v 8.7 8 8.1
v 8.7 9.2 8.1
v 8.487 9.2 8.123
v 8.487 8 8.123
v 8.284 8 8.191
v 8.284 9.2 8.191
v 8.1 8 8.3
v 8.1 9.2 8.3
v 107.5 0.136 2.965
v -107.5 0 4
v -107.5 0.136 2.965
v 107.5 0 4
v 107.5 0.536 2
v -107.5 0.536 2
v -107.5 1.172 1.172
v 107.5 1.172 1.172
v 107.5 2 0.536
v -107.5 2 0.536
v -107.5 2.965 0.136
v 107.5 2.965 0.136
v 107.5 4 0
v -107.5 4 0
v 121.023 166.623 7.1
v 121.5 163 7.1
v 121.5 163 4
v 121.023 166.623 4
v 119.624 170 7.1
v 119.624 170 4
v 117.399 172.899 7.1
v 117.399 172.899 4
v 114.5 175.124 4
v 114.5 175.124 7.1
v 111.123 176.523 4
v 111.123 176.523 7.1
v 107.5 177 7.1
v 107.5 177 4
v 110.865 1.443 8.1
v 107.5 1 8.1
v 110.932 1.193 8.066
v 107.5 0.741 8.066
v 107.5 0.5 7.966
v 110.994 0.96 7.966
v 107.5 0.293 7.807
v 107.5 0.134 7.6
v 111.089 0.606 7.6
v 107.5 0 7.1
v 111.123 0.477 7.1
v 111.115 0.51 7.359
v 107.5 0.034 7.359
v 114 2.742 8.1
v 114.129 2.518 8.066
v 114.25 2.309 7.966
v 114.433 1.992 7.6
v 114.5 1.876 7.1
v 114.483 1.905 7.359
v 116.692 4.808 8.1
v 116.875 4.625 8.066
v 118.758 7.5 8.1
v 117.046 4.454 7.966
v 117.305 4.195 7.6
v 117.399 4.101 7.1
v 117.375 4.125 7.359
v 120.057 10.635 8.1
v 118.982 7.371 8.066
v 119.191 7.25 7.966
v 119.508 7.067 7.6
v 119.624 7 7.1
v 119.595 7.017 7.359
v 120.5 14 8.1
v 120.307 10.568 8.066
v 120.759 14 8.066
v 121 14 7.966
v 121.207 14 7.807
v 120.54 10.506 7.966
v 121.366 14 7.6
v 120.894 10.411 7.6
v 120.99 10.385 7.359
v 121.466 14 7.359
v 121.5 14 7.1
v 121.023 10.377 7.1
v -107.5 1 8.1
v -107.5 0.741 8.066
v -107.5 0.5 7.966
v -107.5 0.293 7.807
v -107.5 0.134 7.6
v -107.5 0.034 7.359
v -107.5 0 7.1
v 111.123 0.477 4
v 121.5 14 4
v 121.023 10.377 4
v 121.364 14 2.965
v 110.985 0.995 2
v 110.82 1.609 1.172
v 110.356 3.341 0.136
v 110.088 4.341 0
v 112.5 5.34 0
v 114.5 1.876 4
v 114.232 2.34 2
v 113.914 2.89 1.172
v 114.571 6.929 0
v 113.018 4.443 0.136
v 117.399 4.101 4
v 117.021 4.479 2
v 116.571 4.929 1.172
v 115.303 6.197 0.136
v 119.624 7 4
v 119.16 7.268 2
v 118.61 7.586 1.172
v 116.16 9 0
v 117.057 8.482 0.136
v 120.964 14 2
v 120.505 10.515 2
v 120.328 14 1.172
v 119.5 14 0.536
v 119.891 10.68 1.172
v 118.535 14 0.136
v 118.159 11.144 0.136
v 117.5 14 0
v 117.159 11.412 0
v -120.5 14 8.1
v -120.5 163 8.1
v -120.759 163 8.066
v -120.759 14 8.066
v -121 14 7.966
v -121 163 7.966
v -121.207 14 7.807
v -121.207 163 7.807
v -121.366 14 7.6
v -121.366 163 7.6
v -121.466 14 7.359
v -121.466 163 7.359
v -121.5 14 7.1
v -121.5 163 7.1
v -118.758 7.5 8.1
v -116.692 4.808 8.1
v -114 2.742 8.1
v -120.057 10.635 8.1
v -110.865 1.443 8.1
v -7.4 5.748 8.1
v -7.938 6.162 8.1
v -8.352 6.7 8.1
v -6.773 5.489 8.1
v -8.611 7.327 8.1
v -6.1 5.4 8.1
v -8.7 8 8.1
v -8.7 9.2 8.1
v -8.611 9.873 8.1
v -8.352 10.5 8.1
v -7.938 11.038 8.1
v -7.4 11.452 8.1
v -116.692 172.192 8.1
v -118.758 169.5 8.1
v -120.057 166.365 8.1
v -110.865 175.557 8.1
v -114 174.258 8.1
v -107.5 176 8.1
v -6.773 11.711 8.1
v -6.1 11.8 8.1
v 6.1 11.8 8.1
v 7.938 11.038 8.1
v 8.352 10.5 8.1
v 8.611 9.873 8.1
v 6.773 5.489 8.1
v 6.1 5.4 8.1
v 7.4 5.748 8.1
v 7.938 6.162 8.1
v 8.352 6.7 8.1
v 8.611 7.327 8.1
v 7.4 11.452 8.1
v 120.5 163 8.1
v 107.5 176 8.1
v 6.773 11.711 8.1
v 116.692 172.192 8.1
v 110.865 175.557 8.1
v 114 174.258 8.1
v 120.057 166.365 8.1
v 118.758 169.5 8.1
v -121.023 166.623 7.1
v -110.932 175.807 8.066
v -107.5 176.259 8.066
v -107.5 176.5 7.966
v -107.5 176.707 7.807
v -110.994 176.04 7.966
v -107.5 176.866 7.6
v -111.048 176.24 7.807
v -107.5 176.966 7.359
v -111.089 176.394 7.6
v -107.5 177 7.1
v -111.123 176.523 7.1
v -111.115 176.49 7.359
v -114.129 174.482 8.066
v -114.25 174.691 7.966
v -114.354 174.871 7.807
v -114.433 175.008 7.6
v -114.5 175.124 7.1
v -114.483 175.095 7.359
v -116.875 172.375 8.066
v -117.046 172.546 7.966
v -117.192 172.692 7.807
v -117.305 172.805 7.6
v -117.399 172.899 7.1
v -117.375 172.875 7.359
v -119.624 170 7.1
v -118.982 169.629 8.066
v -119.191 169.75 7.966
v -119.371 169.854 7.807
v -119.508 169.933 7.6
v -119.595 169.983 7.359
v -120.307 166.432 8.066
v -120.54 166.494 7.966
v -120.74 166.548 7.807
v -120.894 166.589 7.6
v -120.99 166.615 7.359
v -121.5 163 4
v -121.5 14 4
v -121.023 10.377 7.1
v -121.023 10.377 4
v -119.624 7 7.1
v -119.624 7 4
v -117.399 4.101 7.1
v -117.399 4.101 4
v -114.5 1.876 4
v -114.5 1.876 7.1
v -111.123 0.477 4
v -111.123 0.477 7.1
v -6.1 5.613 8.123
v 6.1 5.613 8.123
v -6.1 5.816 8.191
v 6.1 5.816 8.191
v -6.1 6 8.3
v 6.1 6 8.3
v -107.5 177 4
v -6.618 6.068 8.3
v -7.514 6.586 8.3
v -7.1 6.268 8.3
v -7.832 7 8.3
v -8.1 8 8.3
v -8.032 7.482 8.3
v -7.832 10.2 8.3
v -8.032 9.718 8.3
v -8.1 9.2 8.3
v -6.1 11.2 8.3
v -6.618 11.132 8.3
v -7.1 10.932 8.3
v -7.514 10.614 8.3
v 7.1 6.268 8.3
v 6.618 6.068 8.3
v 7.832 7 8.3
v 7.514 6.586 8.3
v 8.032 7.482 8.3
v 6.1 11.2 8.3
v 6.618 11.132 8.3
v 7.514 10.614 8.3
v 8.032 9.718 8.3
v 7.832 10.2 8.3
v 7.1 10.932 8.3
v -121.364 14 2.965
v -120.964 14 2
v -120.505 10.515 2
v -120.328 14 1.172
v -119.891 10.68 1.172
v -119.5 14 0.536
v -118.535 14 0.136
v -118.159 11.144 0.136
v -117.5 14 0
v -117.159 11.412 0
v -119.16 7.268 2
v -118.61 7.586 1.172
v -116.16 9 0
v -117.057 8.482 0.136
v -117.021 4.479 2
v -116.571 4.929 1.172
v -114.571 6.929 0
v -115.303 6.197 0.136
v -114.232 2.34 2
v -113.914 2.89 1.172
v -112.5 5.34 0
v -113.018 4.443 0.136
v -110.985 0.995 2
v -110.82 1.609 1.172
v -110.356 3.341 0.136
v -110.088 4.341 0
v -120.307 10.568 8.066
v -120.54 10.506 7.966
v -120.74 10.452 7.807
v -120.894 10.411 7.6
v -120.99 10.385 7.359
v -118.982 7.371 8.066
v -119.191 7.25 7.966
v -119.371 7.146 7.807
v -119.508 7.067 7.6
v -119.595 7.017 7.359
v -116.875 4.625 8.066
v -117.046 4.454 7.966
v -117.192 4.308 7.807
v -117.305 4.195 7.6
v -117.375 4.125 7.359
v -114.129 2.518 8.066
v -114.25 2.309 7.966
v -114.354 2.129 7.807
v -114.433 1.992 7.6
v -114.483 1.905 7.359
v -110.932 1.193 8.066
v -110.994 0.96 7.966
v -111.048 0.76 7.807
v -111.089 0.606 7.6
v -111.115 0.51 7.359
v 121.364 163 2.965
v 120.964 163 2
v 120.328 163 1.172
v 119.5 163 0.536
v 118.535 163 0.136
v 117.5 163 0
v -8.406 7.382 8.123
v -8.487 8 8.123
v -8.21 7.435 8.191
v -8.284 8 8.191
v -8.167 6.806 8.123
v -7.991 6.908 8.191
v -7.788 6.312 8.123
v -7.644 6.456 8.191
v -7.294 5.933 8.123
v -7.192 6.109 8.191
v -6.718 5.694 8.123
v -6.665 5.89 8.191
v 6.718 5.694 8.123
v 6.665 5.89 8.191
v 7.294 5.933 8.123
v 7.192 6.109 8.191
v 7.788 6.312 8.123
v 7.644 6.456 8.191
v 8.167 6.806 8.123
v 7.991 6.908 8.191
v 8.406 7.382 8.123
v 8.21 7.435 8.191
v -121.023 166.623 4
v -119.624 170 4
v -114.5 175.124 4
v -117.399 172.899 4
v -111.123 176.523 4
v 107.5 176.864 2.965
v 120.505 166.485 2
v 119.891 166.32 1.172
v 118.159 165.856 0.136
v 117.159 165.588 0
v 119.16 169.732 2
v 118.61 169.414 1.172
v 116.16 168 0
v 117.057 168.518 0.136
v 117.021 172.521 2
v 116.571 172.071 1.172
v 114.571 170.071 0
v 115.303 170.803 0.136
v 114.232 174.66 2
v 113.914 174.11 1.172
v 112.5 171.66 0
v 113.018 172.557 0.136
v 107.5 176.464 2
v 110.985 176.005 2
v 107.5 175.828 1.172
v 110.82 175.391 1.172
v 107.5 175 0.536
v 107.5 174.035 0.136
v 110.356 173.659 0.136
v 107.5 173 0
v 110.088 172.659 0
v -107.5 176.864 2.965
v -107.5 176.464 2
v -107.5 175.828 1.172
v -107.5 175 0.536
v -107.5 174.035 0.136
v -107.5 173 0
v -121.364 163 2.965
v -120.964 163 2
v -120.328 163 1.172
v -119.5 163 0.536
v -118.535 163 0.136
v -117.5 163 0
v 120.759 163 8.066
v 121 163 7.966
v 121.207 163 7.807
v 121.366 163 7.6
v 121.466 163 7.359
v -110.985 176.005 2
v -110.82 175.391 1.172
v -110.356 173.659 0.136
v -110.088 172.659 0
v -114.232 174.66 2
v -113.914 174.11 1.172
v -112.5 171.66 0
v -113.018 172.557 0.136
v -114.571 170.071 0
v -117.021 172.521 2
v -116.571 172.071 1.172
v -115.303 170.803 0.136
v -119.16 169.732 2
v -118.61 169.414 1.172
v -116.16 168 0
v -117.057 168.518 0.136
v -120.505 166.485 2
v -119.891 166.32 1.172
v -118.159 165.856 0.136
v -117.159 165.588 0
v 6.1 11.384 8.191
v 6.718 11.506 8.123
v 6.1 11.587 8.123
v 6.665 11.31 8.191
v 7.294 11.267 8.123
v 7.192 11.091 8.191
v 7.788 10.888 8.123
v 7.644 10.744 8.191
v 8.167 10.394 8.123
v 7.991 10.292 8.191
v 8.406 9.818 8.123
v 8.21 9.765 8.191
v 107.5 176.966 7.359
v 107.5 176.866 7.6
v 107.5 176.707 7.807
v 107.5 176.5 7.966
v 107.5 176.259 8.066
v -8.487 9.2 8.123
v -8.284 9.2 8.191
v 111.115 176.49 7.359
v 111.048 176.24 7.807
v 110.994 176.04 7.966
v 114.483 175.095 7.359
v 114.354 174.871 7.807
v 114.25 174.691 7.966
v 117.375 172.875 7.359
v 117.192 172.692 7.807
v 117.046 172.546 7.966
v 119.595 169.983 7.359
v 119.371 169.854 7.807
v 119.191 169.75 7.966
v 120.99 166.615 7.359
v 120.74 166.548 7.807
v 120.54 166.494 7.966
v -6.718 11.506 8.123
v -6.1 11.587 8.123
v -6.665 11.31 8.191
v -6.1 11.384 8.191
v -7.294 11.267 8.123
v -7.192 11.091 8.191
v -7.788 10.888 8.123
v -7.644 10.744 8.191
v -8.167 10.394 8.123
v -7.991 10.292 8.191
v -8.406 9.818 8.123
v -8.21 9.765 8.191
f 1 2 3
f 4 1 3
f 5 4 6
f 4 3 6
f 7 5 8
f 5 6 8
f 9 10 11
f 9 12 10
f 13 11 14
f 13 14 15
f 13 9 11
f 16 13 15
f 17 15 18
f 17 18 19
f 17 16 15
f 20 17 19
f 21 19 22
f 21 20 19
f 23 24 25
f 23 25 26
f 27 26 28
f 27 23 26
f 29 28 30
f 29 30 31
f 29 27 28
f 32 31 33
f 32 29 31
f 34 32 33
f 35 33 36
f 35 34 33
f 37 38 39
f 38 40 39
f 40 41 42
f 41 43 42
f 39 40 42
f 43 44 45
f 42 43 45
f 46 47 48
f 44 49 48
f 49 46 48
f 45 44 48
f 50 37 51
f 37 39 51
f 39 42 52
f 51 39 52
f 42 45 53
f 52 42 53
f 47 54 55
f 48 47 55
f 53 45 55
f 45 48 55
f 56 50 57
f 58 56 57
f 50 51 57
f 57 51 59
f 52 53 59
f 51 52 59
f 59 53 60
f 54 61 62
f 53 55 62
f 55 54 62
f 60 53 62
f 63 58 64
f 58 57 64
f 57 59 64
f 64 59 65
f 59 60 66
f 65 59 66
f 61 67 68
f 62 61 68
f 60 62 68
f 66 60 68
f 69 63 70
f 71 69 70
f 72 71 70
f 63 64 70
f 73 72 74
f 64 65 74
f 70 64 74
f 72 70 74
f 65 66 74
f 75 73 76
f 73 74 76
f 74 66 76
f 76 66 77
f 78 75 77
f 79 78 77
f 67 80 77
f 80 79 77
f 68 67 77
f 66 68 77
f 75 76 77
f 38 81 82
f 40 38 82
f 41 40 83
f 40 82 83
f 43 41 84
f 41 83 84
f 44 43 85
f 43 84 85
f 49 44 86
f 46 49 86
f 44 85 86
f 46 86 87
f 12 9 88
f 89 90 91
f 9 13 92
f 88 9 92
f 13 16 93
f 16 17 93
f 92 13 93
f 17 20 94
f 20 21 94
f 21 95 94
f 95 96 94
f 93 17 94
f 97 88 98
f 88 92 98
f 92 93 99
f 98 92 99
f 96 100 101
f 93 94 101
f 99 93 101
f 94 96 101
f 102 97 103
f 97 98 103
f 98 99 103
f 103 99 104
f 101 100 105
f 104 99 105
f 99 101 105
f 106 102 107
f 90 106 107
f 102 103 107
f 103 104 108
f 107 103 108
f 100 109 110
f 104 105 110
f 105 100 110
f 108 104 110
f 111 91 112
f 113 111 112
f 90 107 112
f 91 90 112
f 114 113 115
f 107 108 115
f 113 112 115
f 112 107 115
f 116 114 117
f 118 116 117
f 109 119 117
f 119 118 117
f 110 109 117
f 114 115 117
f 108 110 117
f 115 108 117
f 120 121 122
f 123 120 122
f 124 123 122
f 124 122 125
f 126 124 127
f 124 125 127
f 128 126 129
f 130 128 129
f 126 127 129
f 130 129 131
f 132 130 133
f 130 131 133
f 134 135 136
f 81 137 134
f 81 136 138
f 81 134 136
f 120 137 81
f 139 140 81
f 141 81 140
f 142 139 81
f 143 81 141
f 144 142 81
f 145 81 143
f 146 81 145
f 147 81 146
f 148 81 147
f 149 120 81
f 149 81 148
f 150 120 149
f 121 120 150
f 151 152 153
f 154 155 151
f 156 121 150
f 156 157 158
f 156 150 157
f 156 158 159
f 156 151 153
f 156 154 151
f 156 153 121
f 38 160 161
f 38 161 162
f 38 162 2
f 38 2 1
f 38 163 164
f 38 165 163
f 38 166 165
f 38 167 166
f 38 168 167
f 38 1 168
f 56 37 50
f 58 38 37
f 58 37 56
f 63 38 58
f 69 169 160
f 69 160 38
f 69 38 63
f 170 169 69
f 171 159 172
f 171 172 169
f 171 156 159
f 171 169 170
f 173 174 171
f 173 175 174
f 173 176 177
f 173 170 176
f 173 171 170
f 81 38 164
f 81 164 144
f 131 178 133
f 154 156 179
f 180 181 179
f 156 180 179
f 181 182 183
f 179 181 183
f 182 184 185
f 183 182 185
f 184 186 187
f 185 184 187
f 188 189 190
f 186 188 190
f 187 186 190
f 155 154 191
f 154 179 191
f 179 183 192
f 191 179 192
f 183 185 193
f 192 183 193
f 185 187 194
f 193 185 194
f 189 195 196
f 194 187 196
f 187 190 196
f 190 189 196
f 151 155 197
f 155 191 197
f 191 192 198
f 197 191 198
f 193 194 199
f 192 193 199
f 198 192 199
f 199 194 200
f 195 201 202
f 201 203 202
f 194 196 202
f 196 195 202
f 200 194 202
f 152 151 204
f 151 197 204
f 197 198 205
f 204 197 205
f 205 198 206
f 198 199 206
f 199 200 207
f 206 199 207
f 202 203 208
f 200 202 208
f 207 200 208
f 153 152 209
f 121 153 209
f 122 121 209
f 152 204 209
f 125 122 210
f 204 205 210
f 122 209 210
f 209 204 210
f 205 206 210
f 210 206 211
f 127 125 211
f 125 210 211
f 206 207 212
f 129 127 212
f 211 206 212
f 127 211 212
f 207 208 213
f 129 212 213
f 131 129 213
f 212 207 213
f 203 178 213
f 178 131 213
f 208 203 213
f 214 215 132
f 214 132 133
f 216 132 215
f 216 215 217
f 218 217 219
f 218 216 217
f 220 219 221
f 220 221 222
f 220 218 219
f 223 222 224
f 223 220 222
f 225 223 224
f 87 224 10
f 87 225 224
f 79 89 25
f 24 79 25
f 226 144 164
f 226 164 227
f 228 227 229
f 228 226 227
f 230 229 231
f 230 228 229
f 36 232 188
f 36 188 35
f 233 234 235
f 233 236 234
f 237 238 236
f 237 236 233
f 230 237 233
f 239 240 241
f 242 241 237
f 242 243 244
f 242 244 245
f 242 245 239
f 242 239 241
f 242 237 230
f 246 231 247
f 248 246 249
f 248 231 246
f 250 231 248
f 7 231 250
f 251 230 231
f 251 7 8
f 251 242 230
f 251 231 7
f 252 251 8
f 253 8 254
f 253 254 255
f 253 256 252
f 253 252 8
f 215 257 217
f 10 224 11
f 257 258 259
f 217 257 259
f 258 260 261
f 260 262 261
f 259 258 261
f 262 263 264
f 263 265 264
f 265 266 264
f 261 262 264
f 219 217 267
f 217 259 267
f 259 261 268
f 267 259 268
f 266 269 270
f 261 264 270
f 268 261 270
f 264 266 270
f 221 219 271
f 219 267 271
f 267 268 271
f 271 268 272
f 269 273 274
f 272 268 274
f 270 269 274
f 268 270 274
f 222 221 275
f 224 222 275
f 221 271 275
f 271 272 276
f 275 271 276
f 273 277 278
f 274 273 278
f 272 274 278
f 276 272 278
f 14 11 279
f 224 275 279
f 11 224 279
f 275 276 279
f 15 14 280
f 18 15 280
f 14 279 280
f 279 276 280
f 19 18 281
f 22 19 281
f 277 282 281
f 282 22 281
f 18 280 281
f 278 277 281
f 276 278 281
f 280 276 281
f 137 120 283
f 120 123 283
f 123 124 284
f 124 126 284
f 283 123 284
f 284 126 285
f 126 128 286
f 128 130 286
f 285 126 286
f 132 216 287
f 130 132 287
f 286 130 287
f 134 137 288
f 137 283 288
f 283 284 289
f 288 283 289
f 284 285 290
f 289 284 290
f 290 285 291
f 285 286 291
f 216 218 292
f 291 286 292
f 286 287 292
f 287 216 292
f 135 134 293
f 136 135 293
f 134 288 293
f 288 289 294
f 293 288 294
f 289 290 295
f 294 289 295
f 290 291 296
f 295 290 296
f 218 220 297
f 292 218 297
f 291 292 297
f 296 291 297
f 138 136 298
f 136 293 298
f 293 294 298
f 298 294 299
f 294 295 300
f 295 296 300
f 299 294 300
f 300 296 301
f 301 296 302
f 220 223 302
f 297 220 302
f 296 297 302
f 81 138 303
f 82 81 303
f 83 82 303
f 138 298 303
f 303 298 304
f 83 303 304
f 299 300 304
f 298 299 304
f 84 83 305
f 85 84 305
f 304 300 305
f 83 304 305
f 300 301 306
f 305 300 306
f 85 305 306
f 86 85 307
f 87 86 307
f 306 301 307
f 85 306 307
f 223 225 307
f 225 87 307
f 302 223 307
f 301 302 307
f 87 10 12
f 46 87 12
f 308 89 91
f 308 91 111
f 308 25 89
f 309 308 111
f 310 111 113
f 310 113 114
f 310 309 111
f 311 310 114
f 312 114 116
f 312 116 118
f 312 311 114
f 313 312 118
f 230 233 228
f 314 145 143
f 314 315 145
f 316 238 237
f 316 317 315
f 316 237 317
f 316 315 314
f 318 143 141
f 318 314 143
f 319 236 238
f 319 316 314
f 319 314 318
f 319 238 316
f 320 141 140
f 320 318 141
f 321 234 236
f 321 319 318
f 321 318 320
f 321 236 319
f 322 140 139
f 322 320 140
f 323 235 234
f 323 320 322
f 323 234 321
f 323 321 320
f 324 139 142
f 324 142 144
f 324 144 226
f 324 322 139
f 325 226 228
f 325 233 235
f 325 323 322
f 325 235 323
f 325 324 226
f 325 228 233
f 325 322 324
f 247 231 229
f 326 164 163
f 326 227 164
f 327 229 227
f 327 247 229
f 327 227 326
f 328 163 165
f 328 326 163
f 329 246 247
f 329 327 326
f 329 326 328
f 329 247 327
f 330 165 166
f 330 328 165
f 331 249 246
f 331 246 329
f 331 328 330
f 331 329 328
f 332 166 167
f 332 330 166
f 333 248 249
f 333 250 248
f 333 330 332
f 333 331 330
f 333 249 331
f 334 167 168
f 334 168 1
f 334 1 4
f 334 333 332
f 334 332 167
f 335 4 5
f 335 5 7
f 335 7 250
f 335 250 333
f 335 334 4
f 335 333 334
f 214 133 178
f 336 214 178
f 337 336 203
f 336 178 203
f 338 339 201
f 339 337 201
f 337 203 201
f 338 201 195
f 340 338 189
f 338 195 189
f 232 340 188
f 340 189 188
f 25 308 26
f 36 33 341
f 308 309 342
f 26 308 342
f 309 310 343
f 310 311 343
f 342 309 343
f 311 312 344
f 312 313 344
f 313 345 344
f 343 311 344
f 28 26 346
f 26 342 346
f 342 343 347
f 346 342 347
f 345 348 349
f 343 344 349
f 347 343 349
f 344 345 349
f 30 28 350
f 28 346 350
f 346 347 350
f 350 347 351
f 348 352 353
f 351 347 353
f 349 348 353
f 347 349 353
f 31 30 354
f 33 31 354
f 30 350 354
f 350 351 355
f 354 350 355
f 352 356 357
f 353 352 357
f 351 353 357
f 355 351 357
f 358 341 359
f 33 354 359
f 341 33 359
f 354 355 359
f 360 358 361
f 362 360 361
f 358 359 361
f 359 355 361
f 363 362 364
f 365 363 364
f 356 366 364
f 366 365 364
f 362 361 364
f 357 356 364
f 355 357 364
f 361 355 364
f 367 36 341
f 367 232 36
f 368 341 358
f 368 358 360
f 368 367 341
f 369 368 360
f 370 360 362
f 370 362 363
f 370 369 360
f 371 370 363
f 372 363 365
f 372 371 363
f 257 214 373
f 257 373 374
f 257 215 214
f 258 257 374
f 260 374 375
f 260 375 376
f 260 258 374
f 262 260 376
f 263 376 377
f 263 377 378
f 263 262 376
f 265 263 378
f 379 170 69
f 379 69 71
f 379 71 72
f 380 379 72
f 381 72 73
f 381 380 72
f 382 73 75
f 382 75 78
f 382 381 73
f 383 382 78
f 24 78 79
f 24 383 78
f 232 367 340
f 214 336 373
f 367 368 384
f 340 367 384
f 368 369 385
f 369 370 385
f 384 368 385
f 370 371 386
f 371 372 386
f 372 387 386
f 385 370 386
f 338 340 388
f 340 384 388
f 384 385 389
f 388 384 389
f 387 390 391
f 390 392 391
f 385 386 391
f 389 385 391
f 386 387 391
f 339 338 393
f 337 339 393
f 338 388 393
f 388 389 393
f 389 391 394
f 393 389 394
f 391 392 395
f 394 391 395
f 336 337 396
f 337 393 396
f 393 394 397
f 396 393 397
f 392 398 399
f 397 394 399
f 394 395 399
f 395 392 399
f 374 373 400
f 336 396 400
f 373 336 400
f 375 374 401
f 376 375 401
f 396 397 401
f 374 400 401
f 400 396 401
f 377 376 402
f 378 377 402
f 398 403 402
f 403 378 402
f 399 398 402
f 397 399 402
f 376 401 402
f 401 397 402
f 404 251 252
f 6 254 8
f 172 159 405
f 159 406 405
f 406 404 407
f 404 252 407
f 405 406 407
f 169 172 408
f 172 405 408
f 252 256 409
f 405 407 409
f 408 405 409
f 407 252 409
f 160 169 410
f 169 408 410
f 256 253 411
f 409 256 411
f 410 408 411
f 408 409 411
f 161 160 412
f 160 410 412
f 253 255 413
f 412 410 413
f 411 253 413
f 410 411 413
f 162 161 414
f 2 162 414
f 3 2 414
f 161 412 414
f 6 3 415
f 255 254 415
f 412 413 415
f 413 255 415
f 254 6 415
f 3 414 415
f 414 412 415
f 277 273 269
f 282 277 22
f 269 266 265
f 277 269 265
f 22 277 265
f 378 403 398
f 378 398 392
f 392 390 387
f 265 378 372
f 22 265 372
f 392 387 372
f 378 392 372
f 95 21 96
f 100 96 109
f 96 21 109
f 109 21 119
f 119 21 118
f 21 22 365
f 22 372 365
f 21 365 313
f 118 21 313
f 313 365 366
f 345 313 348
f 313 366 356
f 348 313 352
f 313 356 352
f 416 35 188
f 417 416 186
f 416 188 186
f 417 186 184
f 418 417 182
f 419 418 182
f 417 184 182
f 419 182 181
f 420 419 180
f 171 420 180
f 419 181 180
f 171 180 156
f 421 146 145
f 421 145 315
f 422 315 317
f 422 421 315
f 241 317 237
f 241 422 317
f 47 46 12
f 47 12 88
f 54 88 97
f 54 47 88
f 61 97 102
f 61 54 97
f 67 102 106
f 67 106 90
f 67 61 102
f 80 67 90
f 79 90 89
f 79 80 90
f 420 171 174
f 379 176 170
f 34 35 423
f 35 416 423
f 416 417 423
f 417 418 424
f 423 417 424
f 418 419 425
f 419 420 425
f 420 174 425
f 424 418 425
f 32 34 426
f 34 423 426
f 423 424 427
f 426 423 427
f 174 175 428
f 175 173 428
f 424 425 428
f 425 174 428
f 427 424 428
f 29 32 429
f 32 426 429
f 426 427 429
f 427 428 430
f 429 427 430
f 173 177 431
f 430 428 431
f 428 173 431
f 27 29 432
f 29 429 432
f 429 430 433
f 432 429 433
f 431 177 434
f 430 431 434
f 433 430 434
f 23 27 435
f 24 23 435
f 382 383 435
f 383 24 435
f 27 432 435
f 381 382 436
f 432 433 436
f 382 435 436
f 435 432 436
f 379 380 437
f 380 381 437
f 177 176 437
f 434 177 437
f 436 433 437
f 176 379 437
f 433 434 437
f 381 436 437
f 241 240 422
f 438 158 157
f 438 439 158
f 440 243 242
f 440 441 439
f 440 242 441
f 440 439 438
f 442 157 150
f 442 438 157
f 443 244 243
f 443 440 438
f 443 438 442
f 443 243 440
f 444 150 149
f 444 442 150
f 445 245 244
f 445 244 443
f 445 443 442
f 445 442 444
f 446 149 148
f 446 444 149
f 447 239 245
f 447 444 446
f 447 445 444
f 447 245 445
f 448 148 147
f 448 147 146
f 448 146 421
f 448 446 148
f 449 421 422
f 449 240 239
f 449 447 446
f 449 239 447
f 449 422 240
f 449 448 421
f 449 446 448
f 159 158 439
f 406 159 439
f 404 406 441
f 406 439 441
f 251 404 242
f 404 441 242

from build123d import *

# Parameters (mm, degrees)
F0_W         = 243
F0_H         = 177
F1_DEPTH     = 8.1
F2_R         = 14
F3_W         = 16.2
F3_H         = 5.2
F4_DEPTH     = 0.2
F5_R         = 2
F6_R         = 4
F7_T1_DEPTH  = 12.2
F7_T3_DEPTH  = 1.2
F7_T6_ANGLE  = 90
F7_T8_ANGLE  = 90
F7_T10_ANGLE = 90
F7_T12_ANGLE = 90
F7_T13_DEPTH = 215
F7_T15_DEPTH = 149
F7_T18_ANGLE = 90
F7_T20_ANGLE = 90
F7_T22_ANGLE = 90
F7_T24_ANGLE = 90


# Not quite as in the source:
# - a fillet or chamfer that OpenCascade refuses, or shapes differently, is made with other operations: its cross-section is extruded or revolved along the edge and cut away or added


with BuildPart() as f1:
    # F0 (on Top) → F1 (new body)
    with BuildSketch(Plane.XY):
        with Locations((0, 88.5)):
            Rectangle(F0_W, F0_H)
    extrude(amount=F1_DEPTH)

    # F2
    f2_edges = [f1.edges().sort_by_distance(p)[0] for p in [
        (-121.5, 0, 4.05),
        (121.5, 0, 4.05),
        (121.5, 177, 4.05),
        (-121.5, 177, 4.05),
    ]]
    fillet(f2_edges, radius=F2_R)

    # F3 (on face) → F4 (join)
    with BuildSketch(Plane.XY.offset(8.1)):
        with Locations((0, 8.6)):
            Rectangle(F3_W, F3_H)
    extrude(amount=F4_DEPTH)

    # F5
    f5_edges = [f1.edges().sort_by_distance(p)[0] for p in [
        (8.1, 6, 8.2),
        (8.1, 11.2, 8.2),
        (-8.1, 6, 8.2),
        (-8.1, 11.2, 8.2),
    ]]
    fillet(f5_edges, radius=F5_R)

    # F6
    f6_edges = [f1.edges().sort_by_distance(p)[0] for p in [
        (121.5, 88.5, 0),
        (0, 177, 0),
        (117.399495, 172.899495, 0),
        (-117.399495, 172.899495, 0),
        (-121.5, 88.5, 0),
        (117.399495, 4.100505, 0),
        (-117.399495, 4.100505, 0),
        (0, 0, 0),
    ]]
    fillet(f6_edges, radius=F6_R)

    # F7: fillet of radius 1 on 16 edges, made by hand

    # F7_s2 → F7_t1 (join)
    with BuildSketch(Plane.YZ.offset(-6.1)):
        with BuildLine():
            ThreePointArc((11.8, 8.1), (11.483772234, 8.1513167019), (11.2, 8.3))
            Line((11.2, 8.3), (11.2, 8.1))
            Line((11.2, 8.1), (11.8, 8.1))
        make_face()
        with BuildLine():
            ThreePointArc((5.4, 8.1), (5.716227766, 8.1513167019), (6, 8.3))
            Line((6, 8.3), (6, 8.1))
            Line((6, 8.1), (5.4, 8.1))
        make_face()
    extrude(amount=F7_T1_DEPTH)

    # F7_s4 → F7_t3 (join)
    with BuildSketch(Plane.XZ.offset(-9.2)):
        with BuildLine():
            ThreePointArc((8.7, 8.1), (8.383772234, 8.1513167019), (8.1, 8.3))
            Line((8.1, 8.3), (8.1, 8.1))
            Line((8.1, 8.1), (8.7, 8.1))
        make_face()
        with BuildLine():
            ThreePointArc((-8.7, 8.1), (-8.383772234, 8.1513167019), (-8.1, 8.3))
            Line((-8.1, 8.3), (-8.1, 8.1))
            Line((-8.1, 8.1), (-8.7, 8.1))
        make_face()
    extrude(amount=F7_T3_DEPTH)

    # F7_s5 → F7_t6 (revolve)
    with BuildSketch(Plane.YZ.offset(6.1)):
        with BuildLine():
            ThreePointArc((11.8, 8.1), (11.483772234, 8.1513167019), (11.2, 8.3))
            Line((11.2, 8.3), (11.2, 8.1))
            Line((11.2, 8.1), (11.8, 8.1))
        make_face()
    revolve(axis=Axis((6.1, 9.2, 8.1), (0, 0, -1)), revolution_arc=F7_T6_ANGLE)

    # F7_s7 → F7_t8 (revolve)
    with BuildSketch(Plane.YZ.offset(-6.1)):
        with BuildLine():
            ThreePointArc((11.8, 8.1), (11.483772234, 8.1513167019), (11.2, 8.3))
            Line((11.2, 8.3), (11.2, 8.1))
            Line((11.2, 8.1), (11.8, 8.1))
        make_face()
    revolve(axis=Axis((-6.1, 9.2, 8.1), (0, 0, 1)), revolution_arc=F7_T8_ANGLE)

    # F7_s9 → F7_t10 (revolve)
    with BuildSketch(Plane.YZ.offset(6.1)):
        with BuildLine():
            ThreePointArc((5.4, 8.1), (5.716227766, 8.1513167019), (6, 8.3))
            Line((6, 8.3), (6, 8.1))
            Line((6, 8.1), (5.4, 8.1))
        make_face()
    revolve(axis=Axis((6.1, 8, 8.1), (0, 0, 1)), revolution_arc=F7_T10_ANGLE)

    # F7_s11 → F7_t12 (revolve)
    with BuildSketch(Plane.XZ.offset(-8)):
        with BuildLine():
            ThreePointArc((-8.7, 8.1), (-8.383772234, 8.1513167019), (-8.1, 8.3))
            Line((-8.1, 8.3), (-8.1, 8.1))
            Line((-8.1, 8.1), (-8.7, 8.1))
        make_face()
    revolve(axis=Axis((-6.1, 8, 8.1), (0, 0, 1)), revolution_arc=F7_T12_ANGLE)

    # F7_s14 → F7_t13 (cut)
    with BuildSketch(Plane.YZ.offset(-107.5)):
        with BuildLine():
            ThreePointArc((177, 7.1), (176.7071067812, 7.8071067812), (176, 8.1))
            Line((176, 8.1), (177, 8.1))
            Line((177, 8.1), (177, 7.1))
        make_face()
        with BuildLine():
            ThreePointArc((1, 8.1), (0.2928932188, 7.8071067812), (0, 7.1))
            Line((0, 7.1), (0, 8.1))
            Line((0, 8.1), (1, 8.1))
        make_face()
    extrude(amount=F7_T13_DEPTH, mode=Mode.SUBTRACT)

    # F7_s16 → F7_t15 (cut)
    with BuildSketch(Plane.XZ.offset(-163)):
        with BuildLine():
            ThreePointArc((120.5, 8.1), (121.2071067812, 7.8071067812), (121.5, 7.1))
            Line((121.5, 7.1), (121.5, 8.1))
            Line((121.5, 8.1), (120.5, 8.1))
        make_face()
        with BuildLine():
            ThreePointArc((-120.5, 8.1), (-121.2071067812, 7.8071067812), (-121.5, 7.1))
            Line((-121.5, 7.1), (-121.5, 8.1))
            Line((-121.5, 8.1), (-120.5, 8.1))
        make_face()
    extrude(amount=F7_T15_DEPTH, mode=Mode.SUBTRACT)

    # F7_s17 → F7_t18 (revolve, cut)
    with BuildSketch(Plane.YZ.offset(107.5)):
        with BuildLine():
            ThreePointArc((177, 7.1), (176.7071067812, 7.8071067812), (176, 8.1))
            Line((176, 8.1), (177, 8.1))
            Line((177, 8.1), (177, 7.1))
        make_face()
    revolve(axis=Axis((107.5, 163, 8.1), (0, 0, -1)), revolution_arc=F7_T18_ANGLE, mode=Mode.SUBTRACT)

    # F7_s19 → F7_t20 (revolve, cut)
    with BuildSketch(Plane.YZ.offset(-107.5)):
        with BuildLine():
            ThreePointArc((176, 8.1), (176.7071067812, 7.8071067812), (177, 7.1))
            Line((177, 7.1), (177, 8.1))
            Line((177, 8.1), (176, 8.1))
        make_face()
    revolve(axis=Axis((-107.5, 163, 8.1), (0, 0, 1)), revolution_arc=F7_T20_ANGLE, mode=Mode.SUBTRACT)

    # F7_s21 → F7_t22 (revolve, cut)
    with BuildSketch(Plane.YZ.offset(107.5)):
        with BuildLine():
            ThreePointArc((1, 8.1), (0.2928932188, 7.8071067812), (0, 7.1))
            Line((0, 7.1), (0, 8.1))
            Line((0, 8.1), (1, 8.1))
        make_face()
    revolve(axis=Axis((107.5, 14, 8.1), (0, 0, 1)), revolution_arc=F7_T22_ANGLE, mode=Mode.SUBTRACT)

    # F7_s23 → F7_t24 (revolve, cut)
    with BuildSketch(Plane.XZ.offset(-14)):
        with BuildLine():
            ThreePointArc((-120.5, 8.1), (-121.2071067812, 7.8071067812), (-121.5, 7.1))
            Line((-121.5, 7.1), (-121.5, 8.1))
            Line((-121.5, 8.1), (-120.5, 8.1))
        make_face()
    revolve(axis=Axis((-107.5, 14, 8.1), (0, 0, 1)), revolution_arc=F7_T24_ANGLE, mode=Mode.SUBTRACT)


solid = f1.part
